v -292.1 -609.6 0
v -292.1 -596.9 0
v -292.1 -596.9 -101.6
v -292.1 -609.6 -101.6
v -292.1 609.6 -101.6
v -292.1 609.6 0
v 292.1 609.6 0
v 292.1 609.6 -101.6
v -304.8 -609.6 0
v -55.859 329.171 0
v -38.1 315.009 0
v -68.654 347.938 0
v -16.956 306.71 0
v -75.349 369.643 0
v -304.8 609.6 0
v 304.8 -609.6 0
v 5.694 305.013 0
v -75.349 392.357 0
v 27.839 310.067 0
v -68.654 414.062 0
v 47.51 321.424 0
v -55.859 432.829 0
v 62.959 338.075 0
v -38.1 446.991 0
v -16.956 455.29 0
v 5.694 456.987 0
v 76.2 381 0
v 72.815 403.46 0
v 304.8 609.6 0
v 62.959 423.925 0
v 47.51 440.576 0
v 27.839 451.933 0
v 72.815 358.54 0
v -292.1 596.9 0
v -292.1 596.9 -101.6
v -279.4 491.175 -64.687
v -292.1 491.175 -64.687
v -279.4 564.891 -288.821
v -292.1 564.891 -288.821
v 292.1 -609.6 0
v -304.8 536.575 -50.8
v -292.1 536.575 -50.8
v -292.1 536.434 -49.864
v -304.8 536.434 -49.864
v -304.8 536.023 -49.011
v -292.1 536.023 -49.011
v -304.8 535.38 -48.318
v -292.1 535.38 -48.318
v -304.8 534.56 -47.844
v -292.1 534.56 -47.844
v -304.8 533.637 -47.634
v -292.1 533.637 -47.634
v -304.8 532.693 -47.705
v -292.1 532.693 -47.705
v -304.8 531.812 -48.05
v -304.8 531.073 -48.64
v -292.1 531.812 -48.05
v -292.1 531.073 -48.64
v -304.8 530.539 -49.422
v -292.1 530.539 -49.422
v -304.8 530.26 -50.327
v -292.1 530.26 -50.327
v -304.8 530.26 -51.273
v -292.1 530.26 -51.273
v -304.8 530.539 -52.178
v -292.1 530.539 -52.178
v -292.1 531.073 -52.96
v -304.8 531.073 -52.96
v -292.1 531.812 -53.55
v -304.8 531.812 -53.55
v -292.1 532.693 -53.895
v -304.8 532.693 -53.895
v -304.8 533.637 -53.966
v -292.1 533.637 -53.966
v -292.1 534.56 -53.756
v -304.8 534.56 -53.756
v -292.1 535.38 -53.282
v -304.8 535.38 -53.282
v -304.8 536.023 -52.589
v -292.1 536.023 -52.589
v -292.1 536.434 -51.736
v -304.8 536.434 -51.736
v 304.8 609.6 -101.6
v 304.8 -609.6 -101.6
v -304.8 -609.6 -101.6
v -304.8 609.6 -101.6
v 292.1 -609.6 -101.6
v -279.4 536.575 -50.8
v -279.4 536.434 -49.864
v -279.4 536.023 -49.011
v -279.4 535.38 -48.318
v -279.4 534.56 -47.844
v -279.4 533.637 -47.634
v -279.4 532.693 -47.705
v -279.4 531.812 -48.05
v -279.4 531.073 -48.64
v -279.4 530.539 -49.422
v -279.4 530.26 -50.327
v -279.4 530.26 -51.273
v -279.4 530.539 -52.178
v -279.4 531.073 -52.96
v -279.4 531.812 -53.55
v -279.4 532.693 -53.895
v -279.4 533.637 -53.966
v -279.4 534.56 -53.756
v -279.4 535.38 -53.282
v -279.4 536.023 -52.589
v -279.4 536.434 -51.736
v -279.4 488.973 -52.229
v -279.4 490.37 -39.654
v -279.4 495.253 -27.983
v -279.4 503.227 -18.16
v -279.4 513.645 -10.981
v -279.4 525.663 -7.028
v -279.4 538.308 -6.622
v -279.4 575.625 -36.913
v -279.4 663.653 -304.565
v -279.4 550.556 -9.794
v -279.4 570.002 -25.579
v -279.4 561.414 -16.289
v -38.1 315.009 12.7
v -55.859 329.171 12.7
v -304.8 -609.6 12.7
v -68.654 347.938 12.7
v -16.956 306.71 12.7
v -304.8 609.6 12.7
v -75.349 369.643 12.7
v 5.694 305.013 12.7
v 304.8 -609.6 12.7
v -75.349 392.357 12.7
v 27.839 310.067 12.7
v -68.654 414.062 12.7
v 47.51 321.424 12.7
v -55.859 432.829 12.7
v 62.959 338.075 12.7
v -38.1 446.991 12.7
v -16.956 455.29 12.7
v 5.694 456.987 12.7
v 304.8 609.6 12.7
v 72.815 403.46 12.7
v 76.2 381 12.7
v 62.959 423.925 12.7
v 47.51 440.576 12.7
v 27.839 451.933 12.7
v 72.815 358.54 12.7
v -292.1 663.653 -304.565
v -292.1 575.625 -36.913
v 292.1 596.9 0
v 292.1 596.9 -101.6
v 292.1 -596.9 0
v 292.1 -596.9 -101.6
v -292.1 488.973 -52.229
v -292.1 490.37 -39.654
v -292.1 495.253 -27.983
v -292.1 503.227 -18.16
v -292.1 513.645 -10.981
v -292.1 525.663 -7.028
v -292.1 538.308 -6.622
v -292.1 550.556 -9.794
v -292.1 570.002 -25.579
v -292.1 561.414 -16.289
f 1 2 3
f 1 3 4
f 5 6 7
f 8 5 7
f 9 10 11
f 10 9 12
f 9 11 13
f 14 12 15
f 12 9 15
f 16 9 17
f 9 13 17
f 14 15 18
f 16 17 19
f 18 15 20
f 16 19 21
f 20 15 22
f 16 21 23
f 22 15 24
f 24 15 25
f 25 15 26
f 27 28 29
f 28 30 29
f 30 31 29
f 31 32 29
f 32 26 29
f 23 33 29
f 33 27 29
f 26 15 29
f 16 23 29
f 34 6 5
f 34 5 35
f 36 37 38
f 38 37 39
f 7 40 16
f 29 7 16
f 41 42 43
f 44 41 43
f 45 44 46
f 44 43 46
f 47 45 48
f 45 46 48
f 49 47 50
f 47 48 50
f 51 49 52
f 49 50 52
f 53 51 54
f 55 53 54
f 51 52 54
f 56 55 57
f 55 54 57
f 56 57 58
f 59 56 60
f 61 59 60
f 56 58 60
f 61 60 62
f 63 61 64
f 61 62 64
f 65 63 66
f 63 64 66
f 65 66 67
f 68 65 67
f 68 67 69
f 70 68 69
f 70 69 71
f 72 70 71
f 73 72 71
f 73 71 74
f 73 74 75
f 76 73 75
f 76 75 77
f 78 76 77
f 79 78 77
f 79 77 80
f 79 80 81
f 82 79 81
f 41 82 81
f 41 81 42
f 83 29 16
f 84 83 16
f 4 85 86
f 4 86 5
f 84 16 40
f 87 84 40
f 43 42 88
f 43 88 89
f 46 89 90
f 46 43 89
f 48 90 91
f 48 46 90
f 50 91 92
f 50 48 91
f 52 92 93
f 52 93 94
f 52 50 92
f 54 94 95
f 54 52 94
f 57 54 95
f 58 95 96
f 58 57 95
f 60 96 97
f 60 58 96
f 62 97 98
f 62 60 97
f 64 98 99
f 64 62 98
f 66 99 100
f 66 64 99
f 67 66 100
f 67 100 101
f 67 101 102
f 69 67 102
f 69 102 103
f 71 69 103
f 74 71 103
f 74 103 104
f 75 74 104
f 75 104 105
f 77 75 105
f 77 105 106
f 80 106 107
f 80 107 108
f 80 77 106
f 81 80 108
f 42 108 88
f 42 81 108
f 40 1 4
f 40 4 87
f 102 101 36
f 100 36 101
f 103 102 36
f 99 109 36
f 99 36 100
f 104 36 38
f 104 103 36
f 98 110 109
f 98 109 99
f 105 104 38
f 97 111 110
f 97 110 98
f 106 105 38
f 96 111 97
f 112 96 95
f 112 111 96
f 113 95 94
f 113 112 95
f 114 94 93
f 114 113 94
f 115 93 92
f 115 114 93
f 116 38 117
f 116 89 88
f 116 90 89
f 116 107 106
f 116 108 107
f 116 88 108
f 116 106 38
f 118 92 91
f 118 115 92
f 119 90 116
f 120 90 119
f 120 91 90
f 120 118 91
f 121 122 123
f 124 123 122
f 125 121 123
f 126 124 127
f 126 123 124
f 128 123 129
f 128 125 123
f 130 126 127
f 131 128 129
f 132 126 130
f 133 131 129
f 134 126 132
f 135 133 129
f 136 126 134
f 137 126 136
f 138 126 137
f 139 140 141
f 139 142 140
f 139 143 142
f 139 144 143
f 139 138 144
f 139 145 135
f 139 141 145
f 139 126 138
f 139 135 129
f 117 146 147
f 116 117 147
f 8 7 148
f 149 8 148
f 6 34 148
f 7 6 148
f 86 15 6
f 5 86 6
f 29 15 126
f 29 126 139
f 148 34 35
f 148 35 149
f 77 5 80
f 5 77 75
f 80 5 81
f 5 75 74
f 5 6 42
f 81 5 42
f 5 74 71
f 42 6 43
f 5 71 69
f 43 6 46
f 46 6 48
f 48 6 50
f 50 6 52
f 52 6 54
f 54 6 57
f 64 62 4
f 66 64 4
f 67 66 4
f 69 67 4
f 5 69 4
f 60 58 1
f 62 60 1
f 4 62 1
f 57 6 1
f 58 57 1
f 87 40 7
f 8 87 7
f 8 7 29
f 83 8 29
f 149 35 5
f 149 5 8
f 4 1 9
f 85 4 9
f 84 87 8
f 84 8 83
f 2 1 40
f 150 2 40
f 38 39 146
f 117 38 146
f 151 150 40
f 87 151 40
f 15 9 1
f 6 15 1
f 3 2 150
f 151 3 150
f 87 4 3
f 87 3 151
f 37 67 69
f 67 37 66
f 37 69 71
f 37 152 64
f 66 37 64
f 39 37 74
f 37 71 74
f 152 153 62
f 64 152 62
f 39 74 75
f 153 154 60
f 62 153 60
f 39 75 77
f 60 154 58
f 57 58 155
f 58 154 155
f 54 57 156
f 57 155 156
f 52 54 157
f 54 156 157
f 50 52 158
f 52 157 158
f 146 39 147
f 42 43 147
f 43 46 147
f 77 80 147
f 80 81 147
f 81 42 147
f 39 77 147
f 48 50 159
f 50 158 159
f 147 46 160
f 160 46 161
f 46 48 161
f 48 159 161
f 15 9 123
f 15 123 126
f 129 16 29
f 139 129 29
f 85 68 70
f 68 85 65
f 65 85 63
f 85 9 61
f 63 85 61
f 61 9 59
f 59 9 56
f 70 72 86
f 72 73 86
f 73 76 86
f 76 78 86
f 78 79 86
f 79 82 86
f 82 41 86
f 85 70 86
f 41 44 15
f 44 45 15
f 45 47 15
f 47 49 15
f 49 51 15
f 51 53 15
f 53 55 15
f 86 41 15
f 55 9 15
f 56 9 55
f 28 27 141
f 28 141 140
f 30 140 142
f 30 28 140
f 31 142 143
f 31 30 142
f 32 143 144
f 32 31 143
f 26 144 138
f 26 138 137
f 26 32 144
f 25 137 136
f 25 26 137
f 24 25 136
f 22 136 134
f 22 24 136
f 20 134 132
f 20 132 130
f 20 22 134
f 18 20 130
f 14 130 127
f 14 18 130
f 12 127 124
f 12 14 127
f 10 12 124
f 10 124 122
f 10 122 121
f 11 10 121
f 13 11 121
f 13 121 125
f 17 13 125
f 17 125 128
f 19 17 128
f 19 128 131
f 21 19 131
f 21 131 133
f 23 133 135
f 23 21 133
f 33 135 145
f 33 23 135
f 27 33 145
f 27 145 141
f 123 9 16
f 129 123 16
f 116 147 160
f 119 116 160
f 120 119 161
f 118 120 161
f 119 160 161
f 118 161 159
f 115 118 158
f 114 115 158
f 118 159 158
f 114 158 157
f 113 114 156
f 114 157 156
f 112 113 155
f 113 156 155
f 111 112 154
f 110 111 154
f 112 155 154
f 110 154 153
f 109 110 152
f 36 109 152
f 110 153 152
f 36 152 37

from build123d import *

# Parameters (mm, degrees)
F0_W     = 609.6
F0_H     = 1219.2
F0_R     = 76.2
F1_DEPTH = 12.7
F3_DEPTH = 101.6
F2_W     = 584.2
F2_H     = 12.7
F4_DEPTH = 101.6
F5_R     = 3.175
F6_DEPTH = 12.7
F7_R     = 3.175
F8_DEPTH = 12.701


with BuildPart() as f1:
    # F0 (on Top) → F1 (new body)
    with BuildSketch(Plane.XY):
        Rectangle(F0_W, F0_H)
        with Locations((0, 381)):
            Circle(F0_R, mode=Mode.SUBTRACT)
    extrude(amount=F1_DEPTH)


with BuildPart() as f3:
    # F2 (on face) → F3 (new body)
    with BuildSketch(Plane(origin=(0, 0, 0), x_dir=(1, 0, 0), z_dir=(0, 0, -1))):
        Polygon((-292.1, 609.6), (-304.8, 609.6), (-304.8, -609.6), (-292.1, -609.6), (-292.1, -596.9), (-292.1, 596.9), align=None)
        Polygon((304.8, 609.6), (292.1, 609.6), (292.1, 596.9), (292.1, -596.9), (292.1, -609.6), (304.8, -609.6), align=None)
    extrude(amount=F3_DEPTH)

    # F7 (on face) → F8 (cut, through all)
    with BuildSketch(Plane.YZ.offset(-292.1)):
        with Locations((533.4, -50.8)):
            Circle(F7_R)
    extrude(amount=-F8_DEPTH, mode=Mode.SUBTRACT)


with BuildPart() as f4:
    # F2 (on face) → F4 (new body)
    with BuildSketch(Plane(origin=(0, 0, 0), x_dir=(1, 0, 0), z_dir=(0, 0, -1))):
        with Locations((0, 603.25)):
            Rectangle(F2_W, F2_H)
        with Locations((0, -603.25)):
            Rectangle(F2_W, F2_H)
    extrude(amount=F4_DEPTH)


with BuildPart() as f6:
    # F5 (on face) → F6 (new body)
    with BuildSketch(Plane.YZ.offset(-292.1)):
        with BuildLine():
            ThreePointArc((491.17509, -64.687387), (540.432257, -94.690202), (577.85, -50.8))
            ThreePointArc((577.85, -50.8), (577.290202, -43.767743), (575.62491, -36.912613))
            ThreePointArc((575.62491, -36.912613), (519.512613, -8.57509), (491.17509, -64.687387))
        make_face()
        with Locations((533.4, -50.8)):
            Circle(F5_R, mode=Mode.SUBTRACT)
        with BuildLine():
            ThreePointArc((575.62491, -36.912613), (577.290202, -43.767743), (577.85, -50.8))
            ThreePointArc((577.85, -50.8), (540.432257, -94.690202), (491.17509, -64.687387))
            Line((491.17509, -64.687387), (564.890687, -288.821301))
            Line((564.890687, -288.821301), (663.653229, -304.56468))
            Line((663.653229, -304.56468), (575.62491, -36.912613))
        make_face()
    extrude(amount=F6_DEPTH)


solid = Compound([f1.part, f3.part, f4.part, f6.part])
